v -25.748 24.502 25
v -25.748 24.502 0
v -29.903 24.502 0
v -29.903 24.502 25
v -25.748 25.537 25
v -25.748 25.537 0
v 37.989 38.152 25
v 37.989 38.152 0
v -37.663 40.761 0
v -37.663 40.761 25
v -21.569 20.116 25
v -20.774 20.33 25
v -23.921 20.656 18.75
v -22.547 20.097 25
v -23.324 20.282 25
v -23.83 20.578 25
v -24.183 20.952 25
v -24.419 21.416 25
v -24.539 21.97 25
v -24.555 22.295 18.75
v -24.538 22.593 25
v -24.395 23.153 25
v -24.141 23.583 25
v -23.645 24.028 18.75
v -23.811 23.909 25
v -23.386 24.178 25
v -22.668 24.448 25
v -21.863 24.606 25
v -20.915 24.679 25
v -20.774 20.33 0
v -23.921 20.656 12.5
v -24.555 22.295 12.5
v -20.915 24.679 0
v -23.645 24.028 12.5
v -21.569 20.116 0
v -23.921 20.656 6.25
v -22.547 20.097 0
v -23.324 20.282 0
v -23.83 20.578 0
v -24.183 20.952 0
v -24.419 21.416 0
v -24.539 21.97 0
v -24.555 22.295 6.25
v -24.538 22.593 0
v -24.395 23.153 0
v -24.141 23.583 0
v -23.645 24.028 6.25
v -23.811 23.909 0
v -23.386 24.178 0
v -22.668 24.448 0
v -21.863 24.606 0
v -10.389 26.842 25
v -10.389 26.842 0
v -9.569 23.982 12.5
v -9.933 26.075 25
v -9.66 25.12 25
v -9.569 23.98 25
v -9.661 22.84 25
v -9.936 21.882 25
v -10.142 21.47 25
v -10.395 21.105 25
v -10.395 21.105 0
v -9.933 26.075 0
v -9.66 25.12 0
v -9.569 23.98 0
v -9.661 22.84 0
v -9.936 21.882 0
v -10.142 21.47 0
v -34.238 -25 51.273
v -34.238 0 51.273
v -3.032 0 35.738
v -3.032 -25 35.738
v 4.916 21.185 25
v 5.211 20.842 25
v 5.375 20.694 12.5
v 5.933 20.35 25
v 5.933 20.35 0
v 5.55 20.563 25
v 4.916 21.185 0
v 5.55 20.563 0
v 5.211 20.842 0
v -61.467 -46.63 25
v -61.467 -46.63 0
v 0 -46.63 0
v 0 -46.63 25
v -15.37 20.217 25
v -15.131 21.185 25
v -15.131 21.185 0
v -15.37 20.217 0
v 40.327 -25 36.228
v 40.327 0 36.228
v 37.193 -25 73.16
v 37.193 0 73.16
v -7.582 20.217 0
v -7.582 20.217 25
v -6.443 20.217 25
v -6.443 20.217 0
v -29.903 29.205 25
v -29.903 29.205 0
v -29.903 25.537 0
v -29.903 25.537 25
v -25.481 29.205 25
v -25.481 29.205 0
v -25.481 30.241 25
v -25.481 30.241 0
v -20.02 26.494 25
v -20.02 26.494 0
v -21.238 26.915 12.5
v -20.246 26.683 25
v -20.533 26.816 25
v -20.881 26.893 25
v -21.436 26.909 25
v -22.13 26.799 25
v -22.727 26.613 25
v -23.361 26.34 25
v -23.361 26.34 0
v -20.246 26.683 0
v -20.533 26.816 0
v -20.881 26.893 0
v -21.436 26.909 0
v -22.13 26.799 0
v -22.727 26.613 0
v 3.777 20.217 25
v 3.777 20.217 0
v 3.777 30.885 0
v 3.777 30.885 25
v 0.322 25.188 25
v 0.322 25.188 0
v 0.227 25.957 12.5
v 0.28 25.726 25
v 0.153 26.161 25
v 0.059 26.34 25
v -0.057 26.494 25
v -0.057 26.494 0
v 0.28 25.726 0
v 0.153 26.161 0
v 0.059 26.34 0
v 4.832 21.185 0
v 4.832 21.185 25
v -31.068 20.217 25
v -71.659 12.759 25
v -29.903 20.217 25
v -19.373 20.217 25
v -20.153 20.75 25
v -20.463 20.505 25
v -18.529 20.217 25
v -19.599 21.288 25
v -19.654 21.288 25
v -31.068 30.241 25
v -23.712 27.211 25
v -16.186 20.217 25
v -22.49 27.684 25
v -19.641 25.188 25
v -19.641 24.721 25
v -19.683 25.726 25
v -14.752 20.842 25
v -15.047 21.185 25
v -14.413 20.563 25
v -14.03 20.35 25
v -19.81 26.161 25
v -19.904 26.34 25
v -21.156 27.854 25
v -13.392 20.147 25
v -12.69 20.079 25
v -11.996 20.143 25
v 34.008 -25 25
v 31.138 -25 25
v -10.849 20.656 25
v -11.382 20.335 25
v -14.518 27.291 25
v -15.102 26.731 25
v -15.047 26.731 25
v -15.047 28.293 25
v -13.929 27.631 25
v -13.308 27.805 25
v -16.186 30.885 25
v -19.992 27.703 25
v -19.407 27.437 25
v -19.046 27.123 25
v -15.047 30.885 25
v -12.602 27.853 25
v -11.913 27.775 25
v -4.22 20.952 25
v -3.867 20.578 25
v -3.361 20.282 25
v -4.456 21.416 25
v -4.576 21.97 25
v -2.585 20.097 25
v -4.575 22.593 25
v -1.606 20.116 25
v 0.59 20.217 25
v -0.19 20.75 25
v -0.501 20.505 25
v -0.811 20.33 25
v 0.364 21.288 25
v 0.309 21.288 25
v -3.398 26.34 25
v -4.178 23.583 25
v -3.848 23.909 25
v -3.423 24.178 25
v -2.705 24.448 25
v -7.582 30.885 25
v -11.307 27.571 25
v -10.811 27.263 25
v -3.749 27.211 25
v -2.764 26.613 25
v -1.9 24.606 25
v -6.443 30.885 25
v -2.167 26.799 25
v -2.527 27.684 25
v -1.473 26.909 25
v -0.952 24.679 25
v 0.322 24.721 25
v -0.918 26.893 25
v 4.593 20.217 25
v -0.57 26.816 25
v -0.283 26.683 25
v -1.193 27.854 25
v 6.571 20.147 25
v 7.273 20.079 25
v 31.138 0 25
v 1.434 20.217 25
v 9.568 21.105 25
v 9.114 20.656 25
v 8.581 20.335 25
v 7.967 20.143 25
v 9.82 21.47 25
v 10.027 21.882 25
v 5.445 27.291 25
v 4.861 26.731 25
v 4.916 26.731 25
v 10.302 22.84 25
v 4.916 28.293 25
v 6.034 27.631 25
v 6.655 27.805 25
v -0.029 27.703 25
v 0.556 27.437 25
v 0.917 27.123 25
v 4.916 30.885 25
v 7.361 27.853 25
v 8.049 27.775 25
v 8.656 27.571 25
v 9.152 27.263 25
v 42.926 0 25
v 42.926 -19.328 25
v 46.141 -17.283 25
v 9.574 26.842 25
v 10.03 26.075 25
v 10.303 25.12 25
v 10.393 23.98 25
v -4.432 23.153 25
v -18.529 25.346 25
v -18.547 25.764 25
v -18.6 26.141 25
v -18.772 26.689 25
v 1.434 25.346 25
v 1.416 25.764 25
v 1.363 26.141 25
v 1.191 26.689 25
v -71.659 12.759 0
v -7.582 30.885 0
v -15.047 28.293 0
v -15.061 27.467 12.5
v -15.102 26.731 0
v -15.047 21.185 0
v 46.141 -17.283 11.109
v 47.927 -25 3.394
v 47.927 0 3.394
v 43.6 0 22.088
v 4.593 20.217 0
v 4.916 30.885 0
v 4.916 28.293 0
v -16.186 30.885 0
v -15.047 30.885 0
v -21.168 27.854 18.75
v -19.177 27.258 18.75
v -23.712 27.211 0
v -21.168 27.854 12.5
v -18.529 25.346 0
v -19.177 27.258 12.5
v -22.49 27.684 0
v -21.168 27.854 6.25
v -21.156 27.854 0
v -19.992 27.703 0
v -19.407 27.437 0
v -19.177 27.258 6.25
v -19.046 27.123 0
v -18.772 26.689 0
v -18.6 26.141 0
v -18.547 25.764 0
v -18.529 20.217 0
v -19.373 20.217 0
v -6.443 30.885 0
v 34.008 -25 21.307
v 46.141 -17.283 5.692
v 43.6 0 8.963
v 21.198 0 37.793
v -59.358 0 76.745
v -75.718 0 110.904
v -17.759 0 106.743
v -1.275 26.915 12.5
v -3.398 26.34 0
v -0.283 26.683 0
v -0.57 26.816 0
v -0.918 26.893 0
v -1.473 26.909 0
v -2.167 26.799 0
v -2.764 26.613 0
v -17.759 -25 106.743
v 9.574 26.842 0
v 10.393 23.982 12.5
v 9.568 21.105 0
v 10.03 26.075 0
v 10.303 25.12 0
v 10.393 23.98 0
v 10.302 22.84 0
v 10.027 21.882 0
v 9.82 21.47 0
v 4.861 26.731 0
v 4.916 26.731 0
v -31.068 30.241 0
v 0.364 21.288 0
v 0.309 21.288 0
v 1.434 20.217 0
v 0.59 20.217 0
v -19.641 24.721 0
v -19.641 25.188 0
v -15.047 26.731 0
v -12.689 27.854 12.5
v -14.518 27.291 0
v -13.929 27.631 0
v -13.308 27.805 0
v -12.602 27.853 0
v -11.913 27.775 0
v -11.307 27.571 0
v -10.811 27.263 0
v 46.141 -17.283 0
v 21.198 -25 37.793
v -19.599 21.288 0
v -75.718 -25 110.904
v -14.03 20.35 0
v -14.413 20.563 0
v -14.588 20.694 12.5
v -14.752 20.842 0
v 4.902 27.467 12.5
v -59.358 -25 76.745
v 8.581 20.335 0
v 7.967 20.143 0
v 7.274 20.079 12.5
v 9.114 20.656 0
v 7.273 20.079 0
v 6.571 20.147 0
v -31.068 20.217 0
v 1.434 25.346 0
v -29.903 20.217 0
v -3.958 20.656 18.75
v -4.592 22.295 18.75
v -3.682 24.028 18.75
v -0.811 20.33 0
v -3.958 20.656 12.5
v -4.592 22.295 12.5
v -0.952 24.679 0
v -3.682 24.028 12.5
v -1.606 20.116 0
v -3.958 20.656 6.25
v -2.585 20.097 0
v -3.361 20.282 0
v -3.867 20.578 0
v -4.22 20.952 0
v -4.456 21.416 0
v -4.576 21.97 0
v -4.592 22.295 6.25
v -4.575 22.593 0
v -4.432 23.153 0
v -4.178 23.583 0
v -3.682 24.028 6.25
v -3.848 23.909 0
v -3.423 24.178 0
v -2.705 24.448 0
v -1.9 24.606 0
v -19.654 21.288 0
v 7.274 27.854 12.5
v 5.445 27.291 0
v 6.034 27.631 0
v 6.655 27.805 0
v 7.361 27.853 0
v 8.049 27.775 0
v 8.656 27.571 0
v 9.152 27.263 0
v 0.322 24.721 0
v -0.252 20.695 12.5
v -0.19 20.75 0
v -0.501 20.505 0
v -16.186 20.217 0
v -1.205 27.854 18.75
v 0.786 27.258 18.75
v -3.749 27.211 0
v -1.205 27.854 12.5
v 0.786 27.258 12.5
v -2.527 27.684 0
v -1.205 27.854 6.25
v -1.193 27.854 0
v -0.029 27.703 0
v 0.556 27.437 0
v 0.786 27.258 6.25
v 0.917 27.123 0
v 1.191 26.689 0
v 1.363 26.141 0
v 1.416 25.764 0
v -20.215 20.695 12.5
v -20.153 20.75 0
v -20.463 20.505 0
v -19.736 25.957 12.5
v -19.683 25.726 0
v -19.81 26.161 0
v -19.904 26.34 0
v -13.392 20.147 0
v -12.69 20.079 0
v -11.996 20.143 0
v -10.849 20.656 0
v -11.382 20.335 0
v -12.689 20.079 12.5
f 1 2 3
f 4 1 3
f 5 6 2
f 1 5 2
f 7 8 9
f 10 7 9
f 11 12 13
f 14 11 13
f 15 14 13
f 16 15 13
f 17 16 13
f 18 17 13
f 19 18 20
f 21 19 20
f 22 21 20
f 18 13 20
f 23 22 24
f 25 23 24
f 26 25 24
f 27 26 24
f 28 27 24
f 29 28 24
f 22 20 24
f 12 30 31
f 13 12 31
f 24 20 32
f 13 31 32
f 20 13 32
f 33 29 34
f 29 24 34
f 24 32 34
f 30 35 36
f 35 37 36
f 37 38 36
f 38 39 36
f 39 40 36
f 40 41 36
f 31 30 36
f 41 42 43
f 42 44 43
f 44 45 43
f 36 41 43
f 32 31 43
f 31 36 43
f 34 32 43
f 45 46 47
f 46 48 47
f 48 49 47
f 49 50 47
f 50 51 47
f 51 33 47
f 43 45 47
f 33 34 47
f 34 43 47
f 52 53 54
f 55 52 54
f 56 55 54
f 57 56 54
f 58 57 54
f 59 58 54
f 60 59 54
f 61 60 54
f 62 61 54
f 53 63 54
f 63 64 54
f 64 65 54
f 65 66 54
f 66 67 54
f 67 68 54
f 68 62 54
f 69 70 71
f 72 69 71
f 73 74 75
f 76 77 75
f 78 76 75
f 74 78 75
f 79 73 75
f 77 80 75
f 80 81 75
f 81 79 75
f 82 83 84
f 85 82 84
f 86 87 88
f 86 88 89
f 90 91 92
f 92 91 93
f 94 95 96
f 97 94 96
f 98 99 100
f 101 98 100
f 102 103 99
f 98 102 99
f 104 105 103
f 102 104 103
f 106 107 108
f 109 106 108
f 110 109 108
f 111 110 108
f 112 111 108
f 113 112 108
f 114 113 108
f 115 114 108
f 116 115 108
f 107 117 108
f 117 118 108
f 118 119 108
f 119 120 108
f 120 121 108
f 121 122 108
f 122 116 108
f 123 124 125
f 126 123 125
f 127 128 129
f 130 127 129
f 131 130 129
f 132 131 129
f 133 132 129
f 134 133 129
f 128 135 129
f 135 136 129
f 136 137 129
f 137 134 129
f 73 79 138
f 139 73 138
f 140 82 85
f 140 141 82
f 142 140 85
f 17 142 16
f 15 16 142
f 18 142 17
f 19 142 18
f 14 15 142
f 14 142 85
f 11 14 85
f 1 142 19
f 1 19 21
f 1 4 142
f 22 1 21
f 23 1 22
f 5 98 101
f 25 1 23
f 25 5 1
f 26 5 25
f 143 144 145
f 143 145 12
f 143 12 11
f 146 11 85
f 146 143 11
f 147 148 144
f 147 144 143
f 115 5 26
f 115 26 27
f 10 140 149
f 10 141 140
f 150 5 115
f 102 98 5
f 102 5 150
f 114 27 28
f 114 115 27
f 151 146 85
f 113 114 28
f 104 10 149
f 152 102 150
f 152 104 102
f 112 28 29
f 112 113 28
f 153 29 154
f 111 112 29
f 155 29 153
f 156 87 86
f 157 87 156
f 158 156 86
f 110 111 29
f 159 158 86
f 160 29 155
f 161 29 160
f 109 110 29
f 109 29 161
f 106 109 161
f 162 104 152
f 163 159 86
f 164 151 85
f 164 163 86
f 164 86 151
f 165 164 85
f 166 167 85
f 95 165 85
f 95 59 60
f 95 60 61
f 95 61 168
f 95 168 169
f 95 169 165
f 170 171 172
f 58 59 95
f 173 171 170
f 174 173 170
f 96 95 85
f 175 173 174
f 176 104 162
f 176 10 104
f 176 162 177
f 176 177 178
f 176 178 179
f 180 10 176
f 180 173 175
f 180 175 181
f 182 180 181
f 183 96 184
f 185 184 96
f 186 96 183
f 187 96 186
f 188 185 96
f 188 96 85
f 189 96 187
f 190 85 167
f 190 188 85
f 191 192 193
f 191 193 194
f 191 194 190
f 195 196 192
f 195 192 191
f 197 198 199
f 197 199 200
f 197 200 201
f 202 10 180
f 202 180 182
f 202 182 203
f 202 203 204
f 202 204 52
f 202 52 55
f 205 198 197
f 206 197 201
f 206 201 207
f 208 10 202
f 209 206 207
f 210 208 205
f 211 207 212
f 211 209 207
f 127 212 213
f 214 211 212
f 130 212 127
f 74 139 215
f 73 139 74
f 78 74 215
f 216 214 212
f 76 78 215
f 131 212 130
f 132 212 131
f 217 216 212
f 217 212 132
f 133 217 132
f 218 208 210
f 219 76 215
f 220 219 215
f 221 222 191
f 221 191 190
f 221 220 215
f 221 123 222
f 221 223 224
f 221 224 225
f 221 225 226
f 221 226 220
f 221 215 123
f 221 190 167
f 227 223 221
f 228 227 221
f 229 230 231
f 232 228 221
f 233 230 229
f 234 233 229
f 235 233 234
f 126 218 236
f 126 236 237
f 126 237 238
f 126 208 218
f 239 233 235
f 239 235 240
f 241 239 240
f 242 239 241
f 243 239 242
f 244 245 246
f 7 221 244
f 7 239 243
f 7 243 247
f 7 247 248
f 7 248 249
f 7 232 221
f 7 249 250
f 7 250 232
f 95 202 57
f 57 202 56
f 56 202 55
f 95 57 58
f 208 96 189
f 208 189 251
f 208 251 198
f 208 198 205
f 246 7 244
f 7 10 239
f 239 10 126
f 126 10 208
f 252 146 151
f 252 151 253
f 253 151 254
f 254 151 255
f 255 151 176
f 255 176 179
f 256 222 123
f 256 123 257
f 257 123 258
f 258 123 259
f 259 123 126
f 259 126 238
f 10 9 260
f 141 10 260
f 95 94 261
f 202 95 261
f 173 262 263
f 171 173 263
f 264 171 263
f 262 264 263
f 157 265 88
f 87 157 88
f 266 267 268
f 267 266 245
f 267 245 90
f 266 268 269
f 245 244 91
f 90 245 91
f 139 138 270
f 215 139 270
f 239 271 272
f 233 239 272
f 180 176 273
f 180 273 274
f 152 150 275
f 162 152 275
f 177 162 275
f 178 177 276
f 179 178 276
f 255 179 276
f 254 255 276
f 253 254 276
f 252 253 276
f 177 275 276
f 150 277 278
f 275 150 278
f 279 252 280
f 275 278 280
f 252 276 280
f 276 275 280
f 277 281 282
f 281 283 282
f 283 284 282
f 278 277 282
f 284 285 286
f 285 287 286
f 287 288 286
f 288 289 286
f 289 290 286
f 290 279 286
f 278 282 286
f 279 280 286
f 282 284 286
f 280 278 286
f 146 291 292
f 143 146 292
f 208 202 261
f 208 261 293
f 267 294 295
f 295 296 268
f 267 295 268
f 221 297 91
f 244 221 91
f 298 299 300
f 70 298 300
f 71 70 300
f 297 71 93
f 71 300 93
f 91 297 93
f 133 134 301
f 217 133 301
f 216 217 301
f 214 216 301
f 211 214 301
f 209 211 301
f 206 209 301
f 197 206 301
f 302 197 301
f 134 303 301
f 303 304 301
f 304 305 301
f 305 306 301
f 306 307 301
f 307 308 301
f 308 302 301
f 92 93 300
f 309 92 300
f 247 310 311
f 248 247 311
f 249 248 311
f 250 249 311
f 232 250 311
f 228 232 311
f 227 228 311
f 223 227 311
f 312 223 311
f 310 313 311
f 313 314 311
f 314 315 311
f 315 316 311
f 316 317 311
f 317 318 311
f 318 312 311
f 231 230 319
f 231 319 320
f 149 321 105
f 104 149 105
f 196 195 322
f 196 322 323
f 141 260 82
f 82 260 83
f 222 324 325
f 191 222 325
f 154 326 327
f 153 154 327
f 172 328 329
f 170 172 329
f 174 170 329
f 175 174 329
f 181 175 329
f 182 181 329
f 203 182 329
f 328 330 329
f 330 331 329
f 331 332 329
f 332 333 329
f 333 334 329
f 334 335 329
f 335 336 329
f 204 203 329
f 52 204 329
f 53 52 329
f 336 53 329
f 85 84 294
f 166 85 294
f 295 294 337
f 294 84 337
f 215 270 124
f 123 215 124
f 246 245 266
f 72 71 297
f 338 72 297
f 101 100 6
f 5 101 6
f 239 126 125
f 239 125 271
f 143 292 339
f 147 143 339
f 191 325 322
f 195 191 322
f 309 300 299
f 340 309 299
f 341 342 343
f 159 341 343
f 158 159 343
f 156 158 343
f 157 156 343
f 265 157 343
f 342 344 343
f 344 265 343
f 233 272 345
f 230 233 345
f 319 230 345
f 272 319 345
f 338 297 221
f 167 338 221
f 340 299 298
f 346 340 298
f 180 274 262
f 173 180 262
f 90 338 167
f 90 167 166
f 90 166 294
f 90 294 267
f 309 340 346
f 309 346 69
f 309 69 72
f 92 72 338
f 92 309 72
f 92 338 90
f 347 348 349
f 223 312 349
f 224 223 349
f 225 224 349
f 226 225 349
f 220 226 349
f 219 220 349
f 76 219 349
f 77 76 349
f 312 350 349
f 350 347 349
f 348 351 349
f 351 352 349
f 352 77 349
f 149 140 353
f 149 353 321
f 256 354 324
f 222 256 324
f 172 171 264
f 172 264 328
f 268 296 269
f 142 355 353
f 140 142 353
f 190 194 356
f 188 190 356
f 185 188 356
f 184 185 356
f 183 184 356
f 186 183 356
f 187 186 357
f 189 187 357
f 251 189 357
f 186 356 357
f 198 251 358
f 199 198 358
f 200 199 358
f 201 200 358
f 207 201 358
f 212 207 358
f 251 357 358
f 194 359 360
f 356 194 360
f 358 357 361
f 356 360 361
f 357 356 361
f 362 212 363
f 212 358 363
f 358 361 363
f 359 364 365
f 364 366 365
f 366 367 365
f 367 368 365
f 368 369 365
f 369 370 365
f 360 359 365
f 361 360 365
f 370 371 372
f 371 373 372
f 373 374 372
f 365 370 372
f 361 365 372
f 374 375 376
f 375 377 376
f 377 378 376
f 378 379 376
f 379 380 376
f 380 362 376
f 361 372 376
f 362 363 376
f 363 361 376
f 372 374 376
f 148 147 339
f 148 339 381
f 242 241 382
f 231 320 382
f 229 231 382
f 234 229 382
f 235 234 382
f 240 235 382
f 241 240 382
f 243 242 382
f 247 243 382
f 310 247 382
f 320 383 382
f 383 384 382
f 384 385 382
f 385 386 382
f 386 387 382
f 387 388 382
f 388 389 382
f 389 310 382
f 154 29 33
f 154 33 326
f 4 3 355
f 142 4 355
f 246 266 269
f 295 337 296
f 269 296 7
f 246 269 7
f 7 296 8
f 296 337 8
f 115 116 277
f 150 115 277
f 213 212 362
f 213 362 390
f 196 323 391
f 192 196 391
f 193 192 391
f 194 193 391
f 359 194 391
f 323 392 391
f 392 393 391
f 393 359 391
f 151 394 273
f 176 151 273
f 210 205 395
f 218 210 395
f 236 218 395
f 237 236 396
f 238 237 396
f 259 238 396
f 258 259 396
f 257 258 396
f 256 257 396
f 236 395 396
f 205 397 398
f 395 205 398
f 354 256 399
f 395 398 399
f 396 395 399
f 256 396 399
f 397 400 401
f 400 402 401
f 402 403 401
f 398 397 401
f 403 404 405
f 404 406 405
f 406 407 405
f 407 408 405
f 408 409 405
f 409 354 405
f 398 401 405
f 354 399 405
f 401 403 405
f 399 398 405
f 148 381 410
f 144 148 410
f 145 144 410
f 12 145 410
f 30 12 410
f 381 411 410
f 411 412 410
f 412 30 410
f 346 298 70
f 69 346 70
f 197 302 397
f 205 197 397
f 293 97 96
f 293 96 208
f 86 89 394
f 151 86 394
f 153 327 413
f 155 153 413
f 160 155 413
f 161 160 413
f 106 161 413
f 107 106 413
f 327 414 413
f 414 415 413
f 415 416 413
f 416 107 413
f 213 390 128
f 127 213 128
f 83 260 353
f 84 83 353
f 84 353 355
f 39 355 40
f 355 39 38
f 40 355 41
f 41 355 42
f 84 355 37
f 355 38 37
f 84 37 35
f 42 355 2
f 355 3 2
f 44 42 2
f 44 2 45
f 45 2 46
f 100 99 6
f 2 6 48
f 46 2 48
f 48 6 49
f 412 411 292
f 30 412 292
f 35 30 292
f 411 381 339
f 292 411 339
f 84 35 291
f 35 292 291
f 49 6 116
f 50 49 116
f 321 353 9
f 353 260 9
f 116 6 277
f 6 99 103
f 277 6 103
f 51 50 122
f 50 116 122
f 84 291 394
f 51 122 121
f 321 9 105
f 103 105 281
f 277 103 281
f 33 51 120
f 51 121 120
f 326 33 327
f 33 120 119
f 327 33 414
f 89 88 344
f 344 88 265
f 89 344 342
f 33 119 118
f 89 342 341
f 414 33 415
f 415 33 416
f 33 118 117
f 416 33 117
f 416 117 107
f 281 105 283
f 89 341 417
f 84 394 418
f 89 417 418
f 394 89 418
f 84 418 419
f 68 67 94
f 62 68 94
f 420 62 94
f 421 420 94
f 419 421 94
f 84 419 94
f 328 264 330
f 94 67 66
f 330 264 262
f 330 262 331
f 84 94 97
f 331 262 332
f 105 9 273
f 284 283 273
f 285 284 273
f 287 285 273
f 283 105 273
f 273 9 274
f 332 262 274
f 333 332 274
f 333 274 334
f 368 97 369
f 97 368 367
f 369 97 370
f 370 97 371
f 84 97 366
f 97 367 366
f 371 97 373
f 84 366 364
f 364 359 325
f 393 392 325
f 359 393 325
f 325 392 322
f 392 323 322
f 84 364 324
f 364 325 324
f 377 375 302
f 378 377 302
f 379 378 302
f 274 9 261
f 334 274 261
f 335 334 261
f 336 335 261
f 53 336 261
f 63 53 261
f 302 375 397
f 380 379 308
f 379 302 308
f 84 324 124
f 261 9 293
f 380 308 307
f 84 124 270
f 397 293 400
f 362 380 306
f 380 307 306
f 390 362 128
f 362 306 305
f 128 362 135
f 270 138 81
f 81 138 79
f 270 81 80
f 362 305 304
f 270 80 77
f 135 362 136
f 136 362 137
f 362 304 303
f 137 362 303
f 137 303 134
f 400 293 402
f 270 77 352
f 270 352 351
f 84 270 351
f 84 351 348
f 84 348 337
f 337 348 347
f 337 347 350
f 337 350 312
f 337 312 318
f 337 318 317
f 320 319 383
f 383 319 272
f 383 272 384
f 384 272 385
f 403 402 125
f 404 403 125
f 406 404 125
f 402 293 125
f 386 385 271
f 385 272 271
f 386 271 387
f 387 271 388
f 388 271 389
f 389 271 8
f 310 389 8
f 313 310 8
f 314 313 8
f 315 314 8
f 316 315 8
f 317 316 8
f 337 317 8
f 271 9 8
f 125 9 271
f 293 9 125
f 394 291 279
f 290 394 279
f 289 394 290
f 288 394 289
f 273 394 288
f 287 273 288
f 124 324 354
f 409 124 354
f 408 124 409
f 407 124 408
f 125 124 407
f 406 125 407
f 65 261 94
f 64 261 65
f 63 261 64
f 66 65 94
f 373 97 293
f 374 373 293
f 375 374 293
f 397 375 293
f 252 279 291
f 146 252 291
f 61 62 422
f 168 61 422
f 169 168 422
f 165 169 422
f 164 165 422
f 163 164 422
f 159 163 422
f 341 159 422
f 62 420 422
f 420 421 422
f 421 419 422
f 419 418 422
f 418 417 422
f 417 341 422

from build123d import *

# Parameters (mm, degrees)
F0_W     = 1.1385447797
F0_H     = 10.6680987737
F1_DEPTH = 25
F3_DEPTH = 25


with BuildPart() as f1:
    # F0 (on Top) → F1 (new body)
    with BuildSketch(Plane.XY):
        Polygon((0, -46.6304384172), (46.141307801, -17.2826088965), (-5.3850366841, -15.2486749252), align=None)
        Polygon((-32.335957761, 9.7168054916), (-37.6630462706, 40.7608710229), (-71.6585168016, 12.759203091), align=None)
        Polygon((46.141307801, -17.2826088965), (37.9891358316, 38.1521731615), (-9.3640666491, 7.9394637296), (-5.3850366841, -15.2486749252), align=None)
        Polygon((-5.3850366841, -15.2486749252), (-28.2065235078, -14.347827062), (-61.4673942327, -46.6304384172), (0, -46.6304384172), align=None)
        Polygon((-28.2065235078, -14.347827062), (-32.335957761, 9.7168054916), (-71.6585168016, 12.759203091), (-61.4673942327, -46.6304384172), align=None)
        Polygon((37.9891358316, 38.1521731615), (-37.6630462706, 40.7608710229), (-32.335957761, 9.7168054916), (-9.3640666491, 7.9394637296), align=None)
        Polygon((-29.9031199126, 24.5017413181), (-29.9031199126, 20.217390731), (-31.0679894271, 20.217390731), (-31.0679894271, 30.2405335024), (-25.4805644678, 30.2405335024), (-25.4805644678, 29.2050939339), (-29.9031199126, 29.2050939339), (-29.9031199126, 25.5371808865), (-25.7481992715, 25.5371808865), (-25.7481992715, 24.5017413181), align=None, mode=Mode.SUBTRACT)
        with BuildLine():
            Line((-18.5286407553, 20.217390731), (-19.3732259965, 20.217390731))
            Line((-19.3732259965, 20.217390731), (-19.5991799701, 21.2879299458))
            Line((-19.5991799701, 21.2879299458), (-19.6540231676, 21.2879299458))
            add(Edge.make_bspline(
                [(-19.6540231676, 21.2879299458), (-20.2156175098, 20.5815495622), (-20.7739212601, 20.3303677178)],
                knots=[0, 0, 0, 1, 1, 1], degree=2))
            add(Edge.make_bspline(
                [(-20.7739212601, 20.3303677178), (-21.3322250105, 20.0791858733), (-22.1702290679, 20.0791858733)],
                knots=[0, 0, 0, 1, 1, 1], degree=2))
            add(Edge.make_bspline(
                [(-22.1702290679, 20.0791858733), (-23.2868365686, 20.0791858733), (-23.9208239315, 20.6561363108)],
                knots=[0, 0, 0, 1, 1, 1], degree=2))
            add(Edge.make_bspline(
                [(-23.9208239315, 20.6561363108), (-24.5548112944, 21.2330867483), (-24.5548112944, 22.2948510515)],
                knots=[0, 0, 0, 1, 1, 1], degree=2))
            add(Edge.make_bspline(
                [(-24.5548112944, 22.2948510515), (-24.5548112944, 24.569746883), (-20.9154167096, 24.6794332779)],
                knots=[0, 0, 0, 1, 1, 1], degree=2))
            Line((-20.9154167096, 24.6794332779), (-19.6408608002, 24.721114108))
            Line((-19.6408608002, 24.721114108), (-19.6408608002, 25.1883781505))
            add(Edge.make_bspline(
                [(-19.6408608002, 25.1883781505), (-19.6408608002, 26.0724504939), (-20.0203757267, 26.4936462506)],
                knots=[0, 0, 0, 1, 1, 1], degree=2))
            add(Edge.make_bspline(
                [(-20.0203757267, 26.4936462506), (-20.3998906533, 26.9148420072), (-21.2378947108, 26.9148420072)],
                knots=[0, 0, 0, 1, 1, 1], degree=2))
            add(Edge.make_bspline(
                [(-21.2378947108, 26.9148420072), (-22.1768102516, 26.9148420072), (-23.3614233172, 26.3400852976)],
                knots=[0, 0, 0, 1, 1, 1], degree=2))
            Line((-23.3614233172, 26.3400852976), (-23.7124197811, 27.2109952736))
            add(Edge.make_bspline(
                [(-23.7124197811, 27.2109952736), (-23.1574066226, 27.5115359958), (-22.495997661, 27.6826467719)],
                knots=[0, 0, 0, 1, 1, 1], degree=2))
            add(Edge.make_bspline(
                [(-22.495997661, 27.6826467719), (-21.8345886994, 27.853757548), (-21.167695418, 27.853757548)],
                knots=[0, 0, 0, 1, 1, 1], degree=2))
            add(Edge.make_bspline(
                [(-21.167695418, 27.853757548), (-19.8251339437, 27.853757548), (-19.1768873495, 27.2581604234)],
                knots=[0, 0, 0, 1, 1, 1], degree=2))
            add(Edge.make_bspline(
                [(-19.1768873495, 27.2581604234), (-18.5286407553, 26.6625632988), (-18.5286407553, 25.3463265593)],
                knots=[0, 0, 0, 1, 1, 1], degree=2))
            Line((-18.5286407553, 25.3463265593), (-18.5286407553, 20.217390731))
        make_face(mode=Mode.SUBTRACT)
        with BuildLine():
            add(Edge.make_bspline(
                [(-15.0471945793, 26.7305688637), (-14.2530650798, 27.853757548), (-12.6889370877, 27.853757548)],
                knots=[0, 0, 0, 1, 1, 1], degree=2))
            add(Edge.make_bspline(
                [(-12.6889370877, 27.853757548), (-11.2081707557, 27.853757548), (-10.3888133854, 26.8424489865)],
                knots=[0, 0, 0, 1, 1, 1], degree=2))
            add(Edge.make_bspline(
                [(-10.3888133854, 26.8424489865), (-9.569456015, 25.831140425), (-9.569456015, 23.981827806)],
                knots=[0, 0, 0, 1, 1, 1], degree=2))
            add(Edge.make_bspline(
                [(-9.569456015, 23.981827806), (-9.569456015, 22.1303214591), (-10.3953945691, 21.1047536662)],
                knots=[0, 0, 0, 1, 1, 1], degree=2))
            add(Edge.make_bspline(
                [(-10.3953945691, 21.1047536662), (-11.2213331231, 20.0791858733), (-12.6889370877, 20.0791858733)],
                knots=[0, 0, 0, 1, 1, 1], degree=2))
            add(Edge.make_bspline(
                [(-12.6889370877, 20.0791858733), (-13.4238359339, 20.0791858733), (-14.030401698, 20.3501112689)],
                knots=[0, 0, 0, 1, 1, 1], degree=2))
            add(Edge.make_bspline(
                [(-14.030401698, 20.3501112689), (-14.6369674621, 20.6210366644), (-15.0471945793, 21.1848247345)],
                knots=[0, 0, 0, 1, 1, 1], degree=2))
            Line((-15.0471945793, 21.1848247345), (-15.1305562395, 21.1848247345))
            Line((-15.1305562395, 21.1848247345), (-15.3696725805, 20.217390731))
            Line((-15.3696725805, 20.217390731), (-16.185739359, 20.217390731))
            Line((-16.185739359, 20.217390731), (-16.185739359, 30.8854895047))
            Line((-16.185739359, 30.8854895047), (-15.0471945793, 30.8854895047))
            Line((-15.0471945793, 30.8854895047), (-15.0471945793, 28.2925031279))
            add(Edge.make_bspline(
                [(-15.0471945793, 28.2925031279), (-15.0471945793, 27.4215931519), (-15.1020377768, 26.7305688637)],
                knots=[0, 0, 0, 1, 1, 1], degree=2))
            Line((-15.1020377768, 26.7305688637), (-15.0471945793, 26.7305688637))
        make_face(mode=Mode.SUBTRACT)
        with BuildLine():
            Line((1.4342831273, 20.217390731), (0.5896978861, 20.217390731))
            Line((0.5896978861, 20.217390731), (0.3637439125, 21.2879299458))
            Line((0.3637439125, 21.2879299458), (0.308900715, 21.2879299458))
            add(Edge.make_bspline(
                [(0.308900715, 21.2879299458), (-0.2526936272, 20.5815495622), (-0.8109973775, 20.3303677178)],
                knots=[0, 0, 0, 1, 1, 1], degree=2))
            add(Edge.make_bspline(
                [(-0.8109973775, 20.3303677178), (-1.3693011279, 20.0791858733), (-2.2073051853, 20.0791858733)],
                knots=[0, 0, 0, 1, 1, 1], degree=2))
            add(Edge.make_bspline(
                [(-2.2073051853, 20.0791858733), (-3.323912686, 20.0791858733), (-3.9579000489, 20.6561363108)],
                knots=[0, 0, 0, 1, 1, 1], degree=2))
            add(Edge.make_bspline(
                [(-3.9579000489, 20.6561363108), (-4.5918874118, 21.2330867483), (-4.5918874118, 22.2948510515)],
                knots=[0, 0, 0, 1, 1, 1], degree=2))
            add(Edge.make_bspline(
                [(-4.5918874118, 22.2948510515), (-4.5918874118, 24.569746883), (-0.952492827, 24.6794332779)],
                knots=[0, 0, 0, 1, 1, 1], degree=2))
            Line((-0.952492827, 24.6794332779), (0.3220630824, 24.721114108))
            Line((0.3220630824, 24.721114108), (0.3220630824, 25.1883781505))
            add(Edge.make_bspline(
                [(0.3220630824, 25.1883781505), (0.3220630824, 26.0724504939), (-0.0574518441, 26.4936462506)],
                knots=[0, 0, 0, 1, 1, 1], degree=2))
            add(Edge.make_bspline(
                [(-0.0574518441, 26.4936462506), (-0.4369667707, 26.9148420072), (-1.2749708282, 26.9148420072)],
                knots=[0, 0, 0, 1, 1, 1], degree=2))
            add(Edge.make_bspline(
                [(-1.2749708282, 26.9148420072), (-2.213886369, 26.9148420072), (-3.3984994346, 26.3400852976)],
                knots=[0, 0, 0, 1, 1, 1], degree=2))
            Line((-3.3984994346, 26.3400852976), (-3.7494958985, 27.2109952736))
            add(Edge.make_bspline(
                [(-3.7494958985, 27.2109952736), (-3.19448274, 27.5115359958), (-2.5330737784, 27.6826467719)],
                knots=[0, 0, 0, 1, 1, 1], degree=2))
            add(Edge.make_bspline(
                [(-2.5330737784, 27.6826467719), (-1.8716648168, 27.853757548), (-1.2047715354, 27.853757548)],
                knots=[0, 0, 0, 1, 1, 1], degree=2))
            add(Edge.make_bspline(
                [(-1.2047715354, 27.853757548), (0.1377899389, 27.853757548), (0.7860365331, 27.2581604234)],
                knots=[0, 0, 0, 1, 1, 1], degree=2))
            add(Edge.make_bspline(
                [(0.7860365331, 27.2581604234), (1.4342831273, 26.6625632988), (1.4342831273, 25.3463265593)],
                knots=[0, 0, 0, 1, 1, 1], degree=2))
            Line((1.4342831273, 25.3463265593), (1.4342831273, 20.217390731))
        make_face(mode=Mode.SUBTRACT)
        with Locations((-7.0126661485, 25.5514401179)):
            Rectangle(F0_W, F0_H, mode=Mode.SUBTRACT)
        with BuildLine():
            add(Edge.make_bspline(
                [(4.9157293033, 26.7305688637), (5.7098588028, 27.853757548), (7.2739867949, 27.853757548)],
                knots=[0, 0, 0, 1, 1, 1], degree=2))
            add(Edge.make_bspline(
                [(7.2739867949, 27.853757548), (8.7547531269, 27.853757548), (9.5741104972, 26.8424489865)],
                knots=[0, 0, 0, 1, 1, 1], degree=2))
            add(Edge.make_bspline(
                [(9.5741104972, 26.8424489865), (10.3934678676, 25.831140425), (10.3934678676, 23.981827806)],
                knots=[0, 0, 0, 1, 1, 1], degree=2))
            add(Edge.make_bspline(
                [(10.3934678676, 23.981827806), (10.3934678676, 22.1303214591), (9.5675293135, 21.1047536662)],
                knots=[0, 0, 0, 1, 1, 1], degree=2))
            add(Edge.make_bspline(
                [(9.5675293135, 21.1047536662), (8.7415907595, 20.0791858733), (7.2739867949, 20.0791858733)],
                knots=[0, 0, 0, 1, 1, 1], degree=2))
            add(Edge.make_bspline(
                [(7.2739867949, 20.0791858733), (6.5390879487, 20.0791858733), (5.9325221846, 20.3501112689)],
                knots=[0, 0, 0, 1, 1, 1], degree=2))
            add(Edge.make_bspline(
                [(5.9325221846, 20.3501112689), (5.3259564205, 20.6210366644), (4.9157293033, 21.1848247345)],
                knots=[0, 0, 0, 1, 1, 1], degree=2))
            Line((4.9157293033, 21.1848247345), (4.8323676432, 21.1848247345))
            Line((4.8323676432, 21.1848247345), (4.5932513021, 20.217390731))
            Line((4.5932513021, 20.217390731), (3.7771845236, 20.217390731))
            Line((3.7771845236, 20.217390731), (3.7771845236, 30.8854895047))
            Line((3.7771845236, 30.8854895047), (4.9157293033, 30.8854895047))
            Line((4.9157293033, 30.8854895047), (4.9157293033, 28.2925031279))
            add(Edge.make_bspline(
                [(4.9157293033, 28.2925031279), (4.9157293033, 27.4215931519), (4.8608861058, 26.7305688637)],
                knots=[0, 0, 0, 1, 1, 1], degree=2))
            Line((4.8608861058, 26.7305688637), (4.9157293033, 26.7305688637))
        make_face(mode=Mode.SUBTRACT)
        Polygon((-9.3640666491, 7.9394637296), (-32.335957761, 9.7168054916), (-28.2065235078, -14.347827062), (-5.3850366841, -15.2486749252), align=None)
    extrude(amount=F1_DEPTH)

    # F2 (on Front) → F3 (join)
    with BuildSketch(Plane.XZ):
        Polygon((-17.7594870329, 106.7427992821), (-75.7184699178, 110.903725028), (-59.3579299748, 76.7451450229), (-34.2380218208, 51.2733086944), (-3.0318840951, 35.7375395996), (21.1975596517, 37.7931054263), (47.9272156954, 3.3937320113), (40.3265580535, 36.2278595567), (37.193346135, 73.1597743332), align=None)
    extrude(amount=F3_DEPTH)


solid = f1.part
